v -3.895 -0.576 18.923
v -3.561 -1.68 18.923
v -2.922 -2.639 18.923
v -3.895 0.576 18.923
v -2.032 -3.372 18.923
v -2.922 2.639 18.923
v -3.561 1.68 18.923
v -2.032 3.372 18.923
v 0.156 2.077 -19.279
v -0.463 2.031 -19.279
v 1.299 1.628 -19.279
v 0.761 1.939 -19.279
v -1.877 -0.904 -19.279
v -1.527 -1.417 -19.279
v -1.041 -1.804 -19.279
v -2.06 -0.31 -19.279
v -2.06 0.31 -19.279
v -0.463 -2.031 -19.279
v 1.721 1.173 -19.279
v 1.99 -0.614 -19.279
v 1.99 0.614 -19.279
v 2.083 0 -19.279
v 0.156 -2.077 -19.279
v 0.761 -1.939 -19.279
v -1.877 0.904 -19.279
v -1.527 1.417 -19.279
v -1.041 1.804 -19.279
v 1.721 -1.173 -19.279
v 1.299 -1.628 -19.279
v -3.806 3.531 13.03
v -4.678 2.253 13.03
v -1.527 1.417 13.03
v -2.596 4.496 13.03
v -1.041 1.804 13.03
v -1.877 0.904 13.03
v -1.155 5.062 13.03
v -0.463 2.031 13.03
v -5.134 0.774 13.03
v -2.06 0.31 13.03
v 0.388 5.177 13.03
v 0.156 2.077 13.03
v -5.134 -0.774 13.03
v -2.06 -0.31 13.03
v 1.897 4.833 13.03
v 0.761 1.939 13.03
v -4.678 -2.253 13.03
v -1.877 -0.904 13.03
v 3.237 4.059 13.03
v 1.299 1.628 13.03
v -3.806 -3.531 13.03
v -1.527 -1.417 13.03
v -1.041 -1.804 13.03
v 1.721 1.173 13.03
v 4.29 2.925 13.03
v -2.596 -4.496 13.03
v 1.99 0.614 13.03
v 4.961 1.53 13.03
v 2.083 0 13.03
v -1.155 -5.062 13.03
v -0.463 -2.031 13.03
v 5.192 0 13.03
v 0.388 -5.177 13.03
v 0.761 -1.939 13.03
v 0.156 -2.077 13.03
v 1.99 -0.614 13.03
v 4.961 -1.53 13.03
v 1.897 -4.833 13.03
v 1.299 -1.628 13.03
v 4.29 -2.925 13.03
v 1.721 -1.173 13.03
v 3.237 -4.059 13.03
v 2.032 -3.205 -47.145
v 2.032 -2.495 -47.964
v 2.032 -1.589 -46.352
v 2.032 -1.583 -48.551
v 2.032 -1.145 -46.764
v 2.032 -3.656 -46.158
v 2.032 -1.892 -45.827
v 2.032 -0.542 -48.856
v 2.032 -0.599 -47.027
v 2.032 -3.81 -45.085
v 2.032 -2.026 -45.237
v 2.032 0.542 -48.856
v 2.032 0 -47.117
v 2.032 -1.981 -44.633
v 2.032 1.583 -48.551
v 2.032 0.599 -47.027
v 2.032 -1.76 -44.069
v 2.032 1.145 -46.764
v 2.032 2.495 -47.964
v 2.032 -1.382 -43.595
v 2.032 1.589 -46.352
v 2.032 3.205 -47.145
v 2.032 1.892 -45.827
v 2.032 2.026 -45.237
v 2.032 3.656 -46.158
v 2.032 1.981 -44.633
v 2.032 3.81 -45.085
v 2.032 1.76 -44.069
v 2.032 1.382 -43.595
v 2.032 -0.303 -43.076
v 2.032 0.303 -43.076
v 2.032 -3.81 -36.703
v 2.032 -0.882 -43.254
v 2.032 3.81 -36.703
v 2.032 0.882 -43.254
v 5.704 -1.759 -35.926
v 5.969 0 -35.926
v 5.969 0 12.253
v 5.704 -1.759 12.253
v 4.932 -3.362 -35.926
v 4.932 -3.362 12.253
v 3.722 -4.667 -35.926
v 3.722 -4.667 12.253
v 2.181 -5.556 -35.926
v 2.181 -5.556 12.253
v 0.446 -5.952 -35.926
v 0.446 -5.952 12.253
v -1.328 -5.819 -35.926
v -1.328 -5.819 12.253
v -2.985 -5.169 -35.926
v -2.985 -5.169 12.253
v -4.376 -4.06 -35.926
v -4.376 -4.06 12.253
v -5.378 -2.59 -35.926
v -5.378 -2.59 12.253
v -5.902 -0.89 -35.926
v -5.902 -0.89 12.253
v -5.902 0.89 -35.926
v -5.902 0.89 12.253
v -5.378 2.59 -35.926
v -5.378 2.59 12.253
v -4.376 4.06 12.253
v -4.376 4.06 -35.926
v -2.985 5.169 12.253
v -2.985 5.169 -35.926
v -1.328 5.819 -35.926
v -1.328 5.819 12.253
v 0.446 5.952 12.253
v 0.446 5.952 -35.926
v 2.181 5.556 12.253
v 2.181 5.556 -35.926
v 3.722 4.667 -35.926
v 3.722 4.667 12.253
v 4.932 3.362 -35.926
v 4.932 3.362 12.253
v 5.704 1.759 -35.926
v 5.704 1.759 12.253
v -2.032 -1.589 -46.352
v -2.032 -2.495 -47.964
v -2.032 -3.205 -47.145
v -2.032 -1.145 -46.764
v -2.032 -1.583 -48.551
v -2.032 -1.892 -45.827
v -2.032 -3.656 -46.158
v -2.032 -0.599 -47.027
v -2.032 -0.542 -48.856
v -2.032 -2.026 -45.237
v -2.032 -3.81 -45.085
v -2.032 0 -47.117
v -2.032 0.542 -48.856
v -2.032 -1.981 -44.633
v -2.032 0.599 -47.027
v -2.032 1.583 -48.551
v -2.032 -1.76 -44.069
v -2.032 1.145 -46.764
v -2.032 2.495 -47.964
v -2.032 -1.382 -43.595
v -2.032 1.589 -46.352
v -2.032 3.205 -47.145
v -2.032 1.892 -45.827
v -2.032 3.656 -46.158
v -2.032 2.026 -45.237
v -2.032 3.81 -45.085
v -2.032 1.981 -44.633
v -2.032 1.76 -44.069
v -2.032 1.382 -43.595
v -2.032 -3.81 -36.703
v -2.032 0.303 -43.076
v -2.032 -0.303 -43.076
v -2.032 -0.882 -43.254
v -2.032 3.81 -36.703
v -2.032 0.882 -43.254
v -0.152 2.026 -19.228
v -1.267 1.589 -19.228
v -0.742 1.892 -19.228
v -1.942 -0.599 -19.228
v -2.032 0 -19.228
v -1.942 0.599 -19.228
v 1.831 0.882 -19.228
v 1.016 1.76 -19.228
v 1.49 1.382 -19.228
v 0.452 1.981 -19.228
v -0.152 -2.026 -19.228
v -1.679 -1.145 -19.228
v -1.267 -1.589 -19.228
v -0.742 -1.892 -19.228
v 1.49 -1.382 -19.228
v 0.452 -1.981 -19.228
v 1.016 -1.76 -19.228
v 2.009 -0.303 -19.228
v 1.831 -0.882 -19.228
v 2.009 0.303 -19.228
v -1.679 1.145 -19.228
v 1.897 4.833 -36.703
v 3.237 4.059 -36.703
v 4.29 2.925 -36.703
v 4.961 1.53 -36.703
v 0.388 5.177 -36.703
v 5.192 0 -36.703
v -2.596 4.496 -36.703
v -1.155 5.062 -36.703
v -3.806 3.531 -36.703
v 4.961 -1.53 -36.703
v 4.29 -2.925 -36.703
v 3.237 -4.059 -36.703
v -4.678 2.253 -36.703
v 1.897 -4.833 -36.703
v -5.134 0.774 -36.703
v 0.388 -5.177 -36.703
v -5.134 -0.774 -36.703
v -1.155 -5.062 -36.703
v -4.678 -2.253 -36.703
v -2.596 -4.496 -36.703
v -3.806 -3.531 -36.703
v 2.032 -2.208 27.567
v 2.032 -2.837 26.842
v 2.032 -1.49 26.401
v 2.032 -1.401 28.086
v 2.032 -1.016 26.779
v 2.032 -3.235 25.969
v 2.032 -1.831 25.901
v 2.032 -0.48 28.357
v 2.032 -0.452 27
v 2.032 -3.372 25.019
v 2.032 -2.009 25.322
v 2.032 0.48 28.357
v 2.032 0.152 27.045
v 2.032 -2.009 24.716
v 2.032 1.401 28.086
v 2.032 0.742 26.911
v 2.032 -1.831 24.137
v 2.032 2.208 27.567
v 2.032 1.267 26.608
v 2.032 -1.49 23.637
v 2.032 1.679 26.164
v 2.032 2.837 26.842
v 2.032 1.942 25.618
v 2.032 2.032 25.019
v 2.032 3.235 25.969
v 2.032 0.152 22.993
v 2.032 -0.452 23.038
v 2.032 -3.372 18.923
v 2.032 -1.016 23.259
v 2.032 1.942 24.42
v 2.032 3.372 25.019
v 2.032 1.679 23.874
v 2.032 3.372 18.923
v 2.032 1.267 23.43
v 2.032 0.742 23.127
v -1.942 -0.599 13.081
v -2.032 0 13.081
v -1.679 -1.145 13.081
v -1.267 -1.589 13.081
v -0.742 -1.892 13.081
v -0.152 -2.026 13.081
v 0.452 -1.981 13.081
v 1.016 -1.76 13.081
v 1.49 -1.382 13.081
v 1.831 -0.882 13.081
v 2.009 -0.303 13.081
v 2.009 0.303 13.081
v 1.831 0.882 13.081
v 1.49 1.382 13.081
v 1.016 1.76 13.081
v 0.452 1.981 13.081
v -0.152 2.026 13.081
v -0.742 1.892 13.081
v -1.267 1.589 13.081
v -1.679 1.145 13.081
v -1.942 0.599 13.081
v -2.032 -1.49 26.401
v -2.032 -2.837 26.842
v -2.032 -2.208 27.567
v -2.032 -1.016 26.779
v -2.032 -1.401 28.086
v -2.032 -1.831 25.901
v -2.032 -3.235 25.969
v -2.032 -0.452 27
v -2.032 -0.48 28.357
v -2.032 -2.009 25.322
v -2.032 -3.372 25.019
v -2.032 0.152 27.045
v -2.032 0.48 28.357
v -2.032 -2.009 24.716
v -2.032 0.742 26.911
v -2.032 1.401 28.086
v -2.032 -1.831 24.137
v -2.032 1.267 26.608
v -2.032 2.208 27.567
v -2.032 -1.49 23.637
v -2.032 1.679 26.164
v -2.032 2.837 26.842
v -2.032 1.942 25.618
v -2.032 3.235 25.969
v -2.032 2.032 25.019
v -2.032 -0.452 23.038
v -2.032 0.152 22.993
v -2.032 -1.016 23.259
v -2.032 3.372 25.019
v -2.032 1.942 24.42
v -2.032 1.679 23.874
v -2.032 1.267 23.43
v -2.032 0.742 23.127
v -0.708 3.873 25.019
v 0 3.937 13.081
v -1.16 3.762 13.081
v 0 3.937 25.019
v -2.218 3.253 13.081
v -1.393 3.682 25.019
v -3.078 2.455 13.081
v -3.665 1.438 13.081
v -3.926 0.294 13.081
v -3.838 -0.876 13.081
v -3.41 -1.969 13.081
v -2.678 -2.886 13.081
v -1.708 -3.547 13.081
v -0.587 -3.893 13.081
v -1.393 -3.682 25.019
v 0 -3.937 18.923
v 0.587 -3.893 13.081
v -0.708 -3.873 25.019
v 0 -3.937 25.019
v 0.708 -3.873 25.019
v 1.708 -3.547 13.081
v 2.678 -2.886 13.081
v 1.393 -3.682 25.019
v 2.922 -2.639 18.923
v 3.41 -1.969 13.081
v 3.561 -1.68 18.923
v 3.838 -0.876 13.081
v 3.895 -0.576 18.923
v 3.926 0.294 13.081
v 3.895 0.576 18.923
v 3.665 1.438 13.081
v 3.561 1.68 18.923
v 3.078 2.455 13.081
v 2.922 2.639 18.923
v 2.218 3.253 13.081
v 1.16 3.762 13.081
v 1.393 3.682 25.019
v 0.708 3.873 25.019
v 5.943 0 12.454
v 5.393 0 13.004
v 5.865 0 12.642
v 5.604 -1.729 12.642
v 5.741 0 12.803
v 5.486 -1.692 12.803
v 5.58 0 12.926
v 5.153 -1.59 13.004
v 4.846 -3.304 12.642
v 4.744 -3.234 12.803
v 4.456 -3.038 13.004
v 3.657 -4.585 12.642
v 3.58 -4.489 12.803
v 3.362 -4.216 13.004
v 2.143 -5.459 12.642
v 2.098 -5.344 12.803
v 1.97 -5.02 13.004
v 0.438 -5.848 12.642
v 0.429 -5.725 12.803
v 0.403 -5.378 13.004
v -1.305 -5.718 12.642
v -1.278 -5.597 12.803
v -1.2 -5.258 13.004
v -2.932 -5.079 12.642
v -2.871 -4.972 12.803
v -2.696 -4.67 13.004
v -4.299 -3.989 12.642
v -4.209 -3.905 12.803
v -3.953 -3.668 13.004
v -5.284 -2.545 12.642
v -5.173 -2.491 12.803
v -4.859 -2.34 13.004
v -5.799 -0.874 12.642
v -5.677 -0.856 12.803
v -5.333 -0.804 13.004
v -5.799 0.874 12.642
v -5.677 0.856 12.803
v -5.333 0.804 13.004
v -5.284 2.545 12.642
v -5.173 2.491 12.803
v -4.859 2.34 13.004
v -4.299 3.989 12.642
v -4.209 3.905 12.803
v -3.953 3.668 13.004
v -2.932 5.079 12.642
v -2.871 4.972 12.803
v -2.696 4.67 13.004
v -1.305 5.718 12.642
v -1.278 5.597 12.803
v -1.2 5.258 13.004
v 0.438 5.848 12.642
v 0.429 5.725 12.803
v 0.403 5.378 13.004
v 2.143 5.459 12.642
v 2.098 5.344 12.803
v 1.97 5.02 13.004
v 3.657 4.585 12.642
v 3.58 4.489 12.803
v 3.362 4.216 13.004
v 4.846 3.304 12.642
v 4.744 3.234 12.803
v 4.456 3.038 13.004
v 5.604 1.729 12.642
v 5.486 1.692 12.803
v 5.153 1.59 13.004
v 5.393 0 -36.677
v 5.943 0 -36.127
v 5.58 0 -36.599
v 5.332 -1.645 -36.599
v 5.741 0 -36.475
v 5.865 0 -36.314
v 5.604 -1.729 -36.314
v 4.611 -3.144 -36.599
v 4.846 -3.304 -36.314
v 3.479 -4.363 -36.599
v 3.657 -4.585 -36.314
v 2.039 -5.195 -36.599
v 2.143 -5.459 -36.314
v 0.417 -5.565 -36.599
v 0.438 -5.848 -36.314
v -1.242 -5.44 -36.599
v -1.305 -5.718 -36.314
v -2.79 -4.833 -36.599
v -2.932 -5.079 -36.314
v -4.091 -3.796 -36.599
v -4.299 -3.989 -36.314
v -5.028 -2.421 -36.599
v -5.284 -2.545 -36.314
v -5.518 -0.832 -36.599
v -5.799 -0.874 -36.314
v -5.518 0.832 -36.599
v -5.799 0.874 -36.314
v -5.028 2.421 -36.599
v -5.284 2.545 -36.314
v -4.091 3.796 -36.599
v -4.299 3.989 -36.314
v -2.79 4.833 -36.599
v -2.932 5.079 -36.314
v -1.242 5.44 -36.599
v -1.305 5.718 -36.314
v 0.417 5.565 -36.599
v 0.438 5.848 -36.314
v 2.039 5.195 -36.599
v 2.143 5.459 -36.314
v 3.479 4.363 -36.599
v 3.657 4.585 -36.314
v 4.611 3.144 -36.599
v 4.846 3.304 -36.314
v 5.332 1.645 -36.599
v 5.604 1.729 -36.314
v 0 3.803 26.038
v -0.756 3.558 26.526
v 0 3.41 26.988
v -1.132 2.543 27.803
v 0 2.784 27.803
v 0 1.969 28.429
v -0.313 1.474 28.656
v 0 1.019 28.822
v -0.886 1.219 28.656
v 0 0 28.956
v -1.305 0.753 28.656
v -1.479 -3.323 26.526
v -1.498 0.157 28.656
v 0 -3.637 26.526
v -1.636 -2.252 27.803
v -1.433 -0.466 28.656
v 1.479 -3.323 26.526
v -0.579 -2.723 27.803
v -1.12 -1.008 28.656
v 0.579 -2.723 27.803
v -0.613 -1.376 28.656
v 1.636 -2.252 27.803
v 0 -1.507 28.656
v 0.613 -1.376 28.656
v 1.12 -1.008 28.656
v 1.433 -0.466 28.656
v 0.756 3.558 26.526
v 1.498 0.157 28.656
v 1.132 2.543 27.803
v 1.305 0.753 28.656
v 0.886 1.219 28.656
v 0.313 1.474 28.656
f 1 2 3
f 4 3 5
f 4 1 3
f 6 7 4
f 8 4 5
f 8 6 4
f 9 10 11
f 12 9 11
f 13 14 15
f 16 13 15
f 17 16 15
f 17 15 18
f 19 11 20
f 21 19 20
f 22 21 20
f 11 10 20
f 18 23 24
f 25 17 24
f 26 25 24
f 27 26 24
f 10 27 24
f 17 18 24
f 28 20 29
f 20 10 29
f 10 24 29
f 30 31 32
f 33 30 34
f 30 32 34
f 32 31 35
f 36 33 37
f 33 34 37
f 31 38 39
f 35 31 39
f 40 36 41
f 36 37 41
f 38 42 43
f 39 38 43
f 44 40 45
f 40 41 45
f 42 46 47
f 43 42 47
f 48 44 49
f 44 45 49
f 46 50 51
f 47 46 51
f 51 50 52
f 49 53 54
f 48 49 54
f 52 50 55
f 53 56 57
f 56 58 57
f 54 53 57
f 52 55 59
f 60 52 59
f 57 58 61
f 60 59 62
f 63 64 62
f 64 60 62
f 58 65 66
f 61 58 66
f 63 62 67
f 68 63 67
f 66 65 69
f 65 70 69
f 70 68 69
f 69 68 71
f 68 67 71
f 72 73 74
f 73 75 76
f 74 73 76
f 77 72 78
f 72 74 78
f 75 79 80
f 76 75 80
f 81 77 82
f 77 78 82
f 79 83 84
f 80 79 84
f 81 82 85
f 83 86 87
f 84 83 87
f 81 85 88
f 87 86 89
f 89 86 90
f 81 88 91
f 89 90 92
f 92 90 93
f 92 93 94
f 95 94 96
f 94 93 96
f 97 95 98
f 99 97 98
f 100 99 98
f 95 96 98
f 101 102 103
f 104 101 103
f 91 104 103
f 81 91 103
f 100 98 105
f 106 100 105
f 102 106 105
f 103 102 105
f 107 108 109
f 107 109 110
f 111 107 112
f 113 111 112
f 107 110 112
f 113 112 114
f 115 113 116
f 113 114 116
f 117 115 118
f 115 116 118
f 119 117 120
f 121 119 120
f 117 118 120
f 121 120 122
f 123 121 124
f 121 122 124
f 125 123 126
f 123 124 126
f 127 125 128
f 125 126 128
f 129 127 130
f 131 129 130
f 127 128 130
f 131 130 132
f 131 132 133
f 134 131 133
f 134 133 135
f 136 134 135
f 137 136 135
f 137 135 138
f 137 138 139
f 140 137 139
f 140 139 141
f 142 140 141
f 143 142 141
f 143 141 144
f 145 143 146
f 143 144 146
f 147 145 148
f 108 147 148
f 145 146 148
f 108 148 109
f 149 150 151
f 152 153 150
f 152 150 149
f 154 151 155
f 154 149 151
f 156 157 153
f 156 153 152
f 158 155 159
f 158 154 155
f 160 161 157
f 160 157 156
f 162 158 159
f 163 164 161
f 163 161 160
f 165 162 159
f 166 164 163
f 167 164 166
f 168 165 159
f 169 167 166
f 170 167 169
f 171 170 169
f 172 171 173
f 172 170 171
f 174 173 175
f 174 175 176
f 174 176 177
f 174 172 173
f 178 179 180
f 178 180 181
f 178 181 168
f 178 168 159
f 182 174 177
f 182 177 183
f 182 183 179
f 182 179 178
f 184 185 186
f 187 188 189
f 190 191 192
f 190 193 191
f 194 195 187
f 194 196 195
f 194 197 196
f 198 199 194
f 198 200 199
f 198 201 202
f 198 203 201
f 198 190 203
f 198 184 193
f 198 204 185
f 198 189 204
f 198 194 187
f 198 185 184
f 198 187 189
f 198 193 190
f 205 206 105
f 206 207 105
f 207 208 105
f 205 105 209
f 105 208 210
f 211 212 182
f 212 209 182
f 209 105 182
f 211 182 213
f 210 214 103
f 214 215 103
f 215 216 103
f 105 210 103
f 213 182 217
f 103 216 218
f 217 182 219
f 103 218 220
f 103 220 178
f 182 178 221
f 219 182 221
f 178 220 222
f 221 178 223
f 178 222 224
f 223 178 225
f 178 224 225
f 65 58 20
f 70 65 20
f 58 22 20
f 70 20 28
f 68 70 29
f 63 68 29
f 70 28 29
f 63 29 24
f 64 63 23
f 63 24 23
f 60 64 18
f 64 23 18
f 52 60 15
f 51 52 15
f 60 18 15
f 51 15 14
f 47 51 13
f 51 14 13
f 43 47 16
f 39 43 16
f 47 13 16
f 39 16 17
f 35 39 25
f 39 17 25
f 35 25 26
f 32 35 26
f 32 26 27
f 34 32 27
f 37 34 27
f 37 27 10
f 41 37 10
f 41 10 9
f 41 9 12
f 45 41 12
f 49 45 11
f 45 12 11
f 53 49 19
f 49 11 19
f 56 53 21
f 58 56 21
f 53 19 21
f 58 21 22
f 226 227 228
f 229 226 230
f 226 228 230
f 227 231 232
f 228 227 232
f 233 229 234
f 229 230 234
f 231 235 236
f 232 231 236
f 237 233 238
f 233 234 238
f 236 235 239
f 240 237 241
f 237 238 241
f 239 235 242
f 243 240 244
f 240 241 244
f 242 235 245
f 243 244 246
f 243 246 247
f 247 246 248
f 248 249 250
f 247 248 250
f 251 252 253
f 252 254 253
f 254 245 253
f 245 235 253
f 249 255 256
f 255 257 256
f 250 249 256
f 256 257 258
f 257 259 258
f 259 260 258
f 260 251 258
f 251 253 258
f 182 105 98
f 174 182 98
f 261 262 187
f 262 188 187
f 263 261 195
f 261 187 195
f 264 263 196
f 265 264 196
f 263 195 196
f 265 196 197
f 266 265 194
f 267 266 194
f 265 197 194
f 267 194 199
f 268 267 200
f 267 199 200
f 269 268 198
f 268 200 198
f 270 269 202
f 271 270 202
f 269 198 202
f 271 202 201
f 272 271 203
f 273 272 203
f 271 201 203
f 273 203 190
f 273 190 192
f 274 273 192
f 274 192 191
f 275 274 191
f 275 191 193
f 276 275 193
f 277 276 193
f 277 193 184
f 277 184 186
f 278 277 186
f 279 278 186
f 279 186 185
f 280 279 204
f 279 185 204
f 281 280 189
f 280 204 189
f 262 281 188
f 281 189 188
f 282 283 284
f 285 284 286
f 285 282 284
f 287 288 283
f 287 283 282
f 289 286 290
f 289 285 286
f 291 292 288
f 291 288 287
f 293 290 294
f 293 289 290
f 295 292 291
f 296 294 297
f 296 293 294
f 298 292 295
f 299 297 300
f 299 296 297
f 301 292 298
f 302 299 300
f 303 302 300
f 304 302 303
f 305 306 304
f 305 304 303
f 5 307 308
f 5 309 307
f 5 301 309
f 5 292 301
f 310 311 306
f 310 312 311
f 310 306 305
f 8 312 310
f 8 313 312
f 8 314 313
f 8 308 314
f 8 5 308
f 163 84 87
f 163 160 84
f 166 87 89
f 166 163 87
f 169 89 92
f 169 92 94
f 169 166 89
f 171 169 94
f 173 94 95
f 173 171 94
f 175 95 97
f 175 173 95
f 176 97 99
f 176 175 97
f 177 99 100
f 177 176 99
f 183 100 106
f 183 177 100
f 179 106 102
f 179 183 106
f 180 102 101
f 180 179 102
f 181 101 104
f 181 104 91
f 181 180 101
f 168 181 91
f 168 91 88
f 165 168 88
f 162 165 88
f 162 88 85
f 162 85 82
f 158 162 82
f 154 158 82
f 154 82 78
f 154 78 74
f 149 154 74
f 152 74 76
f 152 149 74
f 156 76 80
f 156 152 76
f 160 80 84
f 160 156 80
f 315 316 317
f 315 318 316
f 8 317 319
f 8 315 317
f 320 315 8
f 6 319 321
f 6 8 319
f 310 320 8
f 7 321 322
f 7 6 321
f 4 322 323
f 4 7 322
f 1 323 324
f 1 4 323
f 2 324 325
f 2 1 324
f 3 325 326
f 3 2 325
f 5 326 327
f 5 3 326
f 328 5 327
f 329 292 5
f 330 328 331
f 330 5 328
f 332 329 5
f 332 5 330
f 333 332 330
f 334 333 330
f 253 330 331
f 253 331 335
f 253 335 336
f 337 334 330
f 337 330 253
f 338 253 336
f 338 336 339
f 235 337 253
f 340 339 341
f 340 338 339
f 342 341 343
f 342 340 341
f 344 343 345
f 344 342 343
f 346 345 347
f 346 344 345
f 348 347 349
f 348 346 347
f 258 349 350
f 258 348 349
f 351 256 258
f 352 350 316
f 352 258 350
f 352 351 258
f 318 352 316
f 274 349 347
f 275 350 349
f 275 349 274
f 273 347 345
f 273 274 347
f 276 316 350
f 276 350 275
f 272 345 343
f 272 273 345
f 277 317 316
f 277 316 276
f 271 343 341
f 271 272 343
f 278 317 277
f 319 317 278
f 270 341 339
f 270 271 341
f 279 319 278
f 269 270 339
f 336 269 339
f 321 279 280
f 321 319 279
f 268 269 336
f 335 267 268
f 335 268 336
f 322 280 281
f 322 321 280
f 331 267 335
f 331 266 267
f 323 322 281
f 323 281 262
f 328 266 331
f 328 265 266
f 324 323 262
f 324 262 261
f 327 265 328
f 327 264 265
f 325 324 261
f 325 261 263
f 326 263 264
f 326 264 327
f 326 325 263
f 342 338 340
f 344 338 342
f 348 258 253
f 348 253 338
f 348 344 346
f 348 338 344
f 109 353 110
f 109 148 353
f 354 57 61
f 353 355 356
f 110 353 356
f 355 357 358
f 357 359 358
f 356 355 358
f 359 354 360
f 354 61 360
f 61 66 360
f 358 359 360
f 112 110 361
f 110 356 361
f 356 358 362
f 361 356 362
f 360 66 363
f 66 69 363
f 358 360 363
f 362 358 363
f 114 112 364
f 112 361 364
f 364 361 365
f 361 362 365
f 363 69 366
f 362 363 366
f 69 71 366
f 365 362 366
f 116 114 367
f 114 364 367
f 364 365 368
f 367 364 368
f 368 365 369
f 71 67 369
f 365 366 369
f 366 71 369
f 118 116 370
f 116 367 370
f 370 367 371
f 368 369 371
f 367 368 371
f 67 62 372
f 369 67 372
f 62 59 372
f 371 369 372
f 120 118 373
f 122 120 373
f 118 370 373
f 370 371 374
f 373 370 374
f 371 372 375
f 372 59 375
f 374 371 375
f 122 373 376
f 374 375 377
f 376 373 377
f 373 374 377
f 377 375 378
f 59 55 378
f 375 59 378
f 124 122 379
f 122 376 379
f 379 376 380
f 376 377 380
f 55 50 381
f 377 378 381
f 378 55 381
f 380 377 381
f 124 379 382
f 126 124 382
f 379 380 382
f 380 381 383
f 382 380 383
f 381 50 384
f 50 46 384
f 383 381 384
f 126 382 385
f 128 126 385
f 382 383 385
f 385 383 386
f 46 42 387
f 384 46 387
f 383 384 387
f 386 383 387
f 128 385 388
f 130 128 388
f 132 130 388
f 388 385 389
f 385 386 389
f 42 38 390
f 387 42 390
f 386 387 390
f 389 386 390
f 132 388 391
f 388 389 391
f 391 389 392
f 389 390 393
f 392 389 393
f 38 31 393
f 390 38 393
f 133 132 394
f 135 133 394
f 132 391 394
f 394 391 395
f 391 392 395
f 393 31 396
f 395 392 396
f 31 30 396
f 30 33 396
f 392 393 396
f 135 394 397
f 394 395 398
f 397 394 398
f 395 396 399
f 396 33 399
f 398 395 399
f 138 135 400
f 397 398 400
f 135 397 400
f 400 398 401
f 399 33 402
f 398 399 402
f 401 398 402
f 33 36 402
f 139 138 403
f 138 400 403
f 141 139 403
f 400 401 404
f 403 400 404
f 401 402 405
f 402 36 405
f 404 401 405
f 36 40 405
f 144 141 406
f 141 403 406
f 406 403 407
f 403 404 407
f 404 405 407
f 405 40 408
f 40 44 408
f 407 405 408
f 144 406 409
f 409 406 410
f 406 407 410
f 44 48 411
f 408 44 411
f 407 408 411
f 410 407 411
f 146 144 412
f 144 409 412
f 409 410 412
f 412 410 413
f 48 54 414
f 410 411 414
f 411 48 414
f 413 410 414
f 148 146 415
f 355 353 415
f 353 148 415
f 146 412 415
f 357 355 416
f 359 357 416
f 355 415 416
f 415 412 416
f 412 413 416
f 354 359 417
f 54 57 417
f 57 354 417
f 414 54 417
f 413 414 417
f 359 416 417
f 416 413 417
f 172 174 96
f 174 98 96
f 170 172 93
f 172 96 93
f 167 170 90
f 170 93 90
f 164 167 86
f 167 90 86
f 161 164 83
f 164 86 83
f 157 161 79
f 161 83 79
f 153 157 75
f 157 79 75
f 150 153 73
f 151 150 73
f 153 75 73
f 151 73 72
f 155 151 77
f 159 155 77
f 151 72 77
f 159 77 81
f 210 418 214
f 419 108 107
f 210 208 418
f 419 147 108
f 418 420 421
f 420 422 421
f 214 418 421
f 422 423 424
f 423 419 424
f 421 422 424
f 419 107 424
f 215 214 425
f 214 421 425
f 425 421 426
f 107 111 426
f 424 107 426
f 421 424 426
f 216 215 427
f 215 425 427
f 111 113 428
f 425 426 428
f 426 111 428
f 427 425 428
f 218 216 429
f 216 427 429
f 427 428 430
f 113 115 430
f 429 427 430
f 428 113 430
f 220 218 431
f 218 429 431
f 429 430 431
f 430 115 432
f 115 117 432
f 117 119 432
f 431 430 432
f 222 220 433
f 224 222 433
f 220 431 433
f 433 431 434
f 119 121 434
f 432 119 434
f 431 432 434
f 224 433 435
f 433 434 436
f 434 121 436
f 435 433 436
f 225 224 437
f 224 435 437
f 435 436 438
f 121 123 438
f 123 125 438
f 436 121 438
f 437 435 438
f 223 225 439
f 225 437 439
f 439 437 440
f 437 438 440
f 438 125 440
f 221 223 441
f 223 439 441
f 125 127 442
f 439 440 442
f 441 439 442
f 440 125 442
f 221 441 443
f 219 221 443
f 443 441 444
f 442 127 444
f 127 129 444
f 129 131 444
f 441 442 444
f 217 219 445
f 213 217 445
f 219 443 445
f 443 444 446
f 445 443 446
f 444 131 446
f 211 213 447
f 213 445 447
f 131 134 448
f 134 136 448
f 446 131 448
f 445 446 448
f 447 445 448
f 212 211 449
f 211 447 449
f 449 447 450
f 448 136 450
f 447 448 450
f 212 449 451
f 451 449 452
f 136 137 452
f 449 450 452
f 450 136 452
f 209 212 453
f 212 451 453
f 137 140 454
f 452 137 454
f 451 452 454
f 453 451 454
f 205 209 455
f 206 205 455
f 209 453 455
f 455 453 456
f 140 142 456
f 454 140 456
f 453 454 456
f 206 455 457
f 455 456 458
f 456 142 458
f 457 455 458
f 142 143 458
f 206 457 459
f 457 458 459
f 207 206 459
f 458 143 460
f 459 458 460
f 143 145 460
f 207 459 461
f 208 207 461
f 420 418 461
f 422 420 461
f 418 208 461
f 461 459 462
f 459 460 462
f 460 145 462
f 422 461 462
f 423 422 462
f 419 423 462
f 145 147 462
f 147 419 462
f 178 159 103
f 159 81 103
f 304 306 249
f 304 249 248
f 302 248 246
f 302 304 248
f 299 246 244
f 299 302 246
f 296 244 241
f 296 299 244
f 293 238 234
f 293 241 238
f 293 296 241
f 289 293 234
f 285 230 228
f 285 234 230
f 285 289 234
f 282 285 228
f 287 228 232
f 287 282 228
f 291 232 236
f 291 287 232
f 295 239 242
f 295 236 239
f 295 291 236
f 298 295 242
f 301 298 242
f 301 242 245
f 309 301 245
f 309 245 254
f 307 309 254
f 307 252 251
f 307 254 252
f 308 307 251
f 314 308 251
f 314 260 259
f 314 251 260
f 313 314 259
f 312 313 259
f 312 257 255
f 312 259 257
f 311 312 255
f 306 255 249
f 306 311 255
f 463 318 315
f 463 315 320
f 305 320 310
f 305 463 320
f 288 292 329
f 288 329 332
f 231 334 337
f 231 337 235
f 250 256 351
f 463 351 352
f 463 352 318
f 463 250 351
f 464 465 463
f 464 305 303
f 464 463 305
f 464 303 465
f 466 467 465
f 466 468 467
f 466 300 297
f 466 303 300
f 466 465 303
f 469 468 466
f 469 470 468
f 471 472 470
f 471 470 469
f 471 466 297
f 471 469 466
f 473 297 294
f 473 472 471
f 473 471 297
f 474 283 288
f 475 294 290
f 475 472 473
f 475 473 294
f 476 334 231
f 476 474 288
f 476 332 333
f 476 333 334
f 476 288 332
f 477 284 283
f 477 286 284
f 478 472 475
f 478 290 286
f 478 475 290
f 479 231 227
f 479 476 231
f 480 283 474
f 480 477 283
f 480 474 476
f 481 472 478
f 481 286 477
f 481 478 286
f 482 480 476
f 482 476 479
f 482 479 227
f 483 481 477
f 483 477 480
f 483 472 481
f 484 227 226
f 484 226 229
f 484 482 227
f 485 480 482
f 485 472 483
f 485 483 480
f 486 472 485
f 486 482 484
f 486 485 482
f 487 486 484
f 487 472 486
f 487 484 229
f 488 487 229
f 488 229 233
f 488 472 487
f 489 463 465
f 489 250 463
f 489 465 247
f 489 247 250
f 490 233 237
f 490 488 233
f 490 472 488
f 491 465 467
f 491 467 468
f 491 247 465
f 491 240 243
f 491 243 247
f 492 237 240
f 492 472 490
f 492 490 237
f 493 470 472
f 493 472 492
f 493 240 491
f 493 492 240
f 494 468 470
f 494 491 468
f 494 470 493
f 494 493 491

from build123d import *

# Parameters (mm, degrees)
FILLET2_R               = 0.77724
SKETCH2_R               = 2.032
EXTRUDE2_DEPTH          = 2.032
SKETCH9_W               = 32.3088
SKETCH9_H               = 2.032
CUT_EXTRUDE1_DEPTH      = 50.743486078
CUT_EXTRUDE1_DEPTH_BACK = 50.743486078
SKETCH12_R              = 2.032
CUT_EXTRUDE2_DEPTH      = 95.358350575
CUT_EXTRUDE2_DEPTH_BACK = 6.096
SKETCH13_OUTSIDE_W      = 33.81
SKETCH13_OUTSIDE_H      = 33.81
SKETCH13_OUTSIDE_W_2    = 4.064
SKETCH13_OUTSIDE_H_2    = 7.874
LPATTERN1_COUNT         = 2
LPATTERN1_PITCH         = 20.066


with BuildPart() as part:
    # Sketch1 → Revolve1 (revolve)
    with BuildSketch(Plane(origin=(0, 0, 0), x_dir=(0, 0, -1), z_dir=(1, 0, 0)), mode=Mode.PRIVATE) as revolve1_sk:
        Polygon((36.703, 0), (36.703, 5.969), (-13.0302, 5.969), (-13.0302, 2.0828), (7.0866, 2.0828), (19.2786, 2.0828), (19.2786, 0), align=None)
    revolve(revolve1_sk.sketch.rotate(Axis((0, 0, 45.085), (0, 0, -1)), 90), axis=Axis((0, 0, 45.085), (0, 0, -1)))

    # Fillet2
    fillet2_edges = [part.edges().sort_by_distance(p)[0] for p in [
        (-5.969, 0, 13.0302),
        (-5.969, 0, -36.703),
    ]]
    fillet(fillet2_edges, radius=FILLET2_R)

    # Sketch2 → Extrude2 (add, symmetric)
    with BuildSketch(Plane(origin=(0, 0, 0), x_dir=(0, 0, -1), z_dir=(1, 0, 0))):
        with BuildLine():
            Line((36.703, 3.81), (45.085, 3.81))
            ThreePointArc((45.085, 3.81), (48.895, 0), (45.085, -3.81))
            Line((45.085, -3.81), (36.703, -3.81))
            Line((36.703, -3.81), (36.703, 3.81))
        make_face()
        with Locations((45.085, 0)):
            Circle(SKETCH2_R, mode=Mode.SUBTRACT)
    extrude(amount=EXTRUDE2_DEPTH, both=True)


with BuildPart() as body_2:
    # Sketch9 → Revolve5 (revolve)
    with BuildSketch(Plane(origin=(0, 0, 0), x_dir=(0, 0, -1), z_dir=(1, 0, 0)), mode=Mode.PRIVATE) as revolve5_sk:
        with Locations((-16.9926, 1.016)):
            Rectangle(SKETCH9_W, SKETCH9_H)
    revolve(revolve5_sk.sketch.rotate(Axis((0, 0, 33.147), (0, 0, 1)), 90), axis=Axis((0, 0, 33.147), (0, 0, 1)))

    # Sketch11 → Revolve6 (revolve)
    with BuildSketch(Plane(origin=(0, 0, 0), x_dir=(0, 0, -1), z_dir=(1, 0, 0))):
        with BuildLine():
            Line((-33.147, 0), (-33.147, 3.937))
            Line((-33.147, 3.937), (-45.085, 3.937))
            ThreePointArc((-45.085, 3.937), (-47.868879398, 2.783879398), (-49.022, 0))
            Line((-49.022, 0), (-33.147, 0))
        make_face()
    revolve(axis=Axis((0, 0, 49.022), (0, 0, 1)))

    # Sketch12 → Cut-Extrude1 (cut, two sides: drawn at the far end of the back side and taken through both)
    with BuildSketch(Plane(origin=(0, 0, 0), x_dir=(0, 0, -1), z_dir=(1, 0, 0)).offset(-CUT_EXTRUDE1_DEPTH_BACK)):
        with Locations(Location((-45.085, 0, 0), (0, 0, 90))):
            Circle(SKETCH12_R)
    extrude(amount=CUT_EXTRUDE1_DEPTH + CUT_EXTRUDE1_DEPTH_BACK, mode=Mode.SUBTRACT)

    # Sketch13 outside → Cut-Extrude2 (cut, two sides: drawn at the far end of the back side and taken through both)
    with BuildSketch(Plane.XY.offset(45.085).offset(-CUT_EXTRUDE2_DEPTH_BACK)):
        Rectangle(SKETCH13_OUTSIDE_W, SKETCH13_OUTSIDE_H)
        Rectangle(SKETCH13_OUTSIDE_W_2, SKETCH13_OUTSIDE_H_2, mode=Mode.SUBTRACT)
    extrude(amount=CUT_EXTRUDE2_DEPTH + CUT_EXTRUDE2_DEPTH_BACK, mode=Mode.SUBTRACT)


with BuildPart() as lpattern1_1:
    # LPattern1: pattern copy
    add(body_2.part.moved(Location(Vector(0, 0, -1) * (1 * LPATTERN1_PITCH))))


solid = Compound([part.part, lpattern1_1.part])
